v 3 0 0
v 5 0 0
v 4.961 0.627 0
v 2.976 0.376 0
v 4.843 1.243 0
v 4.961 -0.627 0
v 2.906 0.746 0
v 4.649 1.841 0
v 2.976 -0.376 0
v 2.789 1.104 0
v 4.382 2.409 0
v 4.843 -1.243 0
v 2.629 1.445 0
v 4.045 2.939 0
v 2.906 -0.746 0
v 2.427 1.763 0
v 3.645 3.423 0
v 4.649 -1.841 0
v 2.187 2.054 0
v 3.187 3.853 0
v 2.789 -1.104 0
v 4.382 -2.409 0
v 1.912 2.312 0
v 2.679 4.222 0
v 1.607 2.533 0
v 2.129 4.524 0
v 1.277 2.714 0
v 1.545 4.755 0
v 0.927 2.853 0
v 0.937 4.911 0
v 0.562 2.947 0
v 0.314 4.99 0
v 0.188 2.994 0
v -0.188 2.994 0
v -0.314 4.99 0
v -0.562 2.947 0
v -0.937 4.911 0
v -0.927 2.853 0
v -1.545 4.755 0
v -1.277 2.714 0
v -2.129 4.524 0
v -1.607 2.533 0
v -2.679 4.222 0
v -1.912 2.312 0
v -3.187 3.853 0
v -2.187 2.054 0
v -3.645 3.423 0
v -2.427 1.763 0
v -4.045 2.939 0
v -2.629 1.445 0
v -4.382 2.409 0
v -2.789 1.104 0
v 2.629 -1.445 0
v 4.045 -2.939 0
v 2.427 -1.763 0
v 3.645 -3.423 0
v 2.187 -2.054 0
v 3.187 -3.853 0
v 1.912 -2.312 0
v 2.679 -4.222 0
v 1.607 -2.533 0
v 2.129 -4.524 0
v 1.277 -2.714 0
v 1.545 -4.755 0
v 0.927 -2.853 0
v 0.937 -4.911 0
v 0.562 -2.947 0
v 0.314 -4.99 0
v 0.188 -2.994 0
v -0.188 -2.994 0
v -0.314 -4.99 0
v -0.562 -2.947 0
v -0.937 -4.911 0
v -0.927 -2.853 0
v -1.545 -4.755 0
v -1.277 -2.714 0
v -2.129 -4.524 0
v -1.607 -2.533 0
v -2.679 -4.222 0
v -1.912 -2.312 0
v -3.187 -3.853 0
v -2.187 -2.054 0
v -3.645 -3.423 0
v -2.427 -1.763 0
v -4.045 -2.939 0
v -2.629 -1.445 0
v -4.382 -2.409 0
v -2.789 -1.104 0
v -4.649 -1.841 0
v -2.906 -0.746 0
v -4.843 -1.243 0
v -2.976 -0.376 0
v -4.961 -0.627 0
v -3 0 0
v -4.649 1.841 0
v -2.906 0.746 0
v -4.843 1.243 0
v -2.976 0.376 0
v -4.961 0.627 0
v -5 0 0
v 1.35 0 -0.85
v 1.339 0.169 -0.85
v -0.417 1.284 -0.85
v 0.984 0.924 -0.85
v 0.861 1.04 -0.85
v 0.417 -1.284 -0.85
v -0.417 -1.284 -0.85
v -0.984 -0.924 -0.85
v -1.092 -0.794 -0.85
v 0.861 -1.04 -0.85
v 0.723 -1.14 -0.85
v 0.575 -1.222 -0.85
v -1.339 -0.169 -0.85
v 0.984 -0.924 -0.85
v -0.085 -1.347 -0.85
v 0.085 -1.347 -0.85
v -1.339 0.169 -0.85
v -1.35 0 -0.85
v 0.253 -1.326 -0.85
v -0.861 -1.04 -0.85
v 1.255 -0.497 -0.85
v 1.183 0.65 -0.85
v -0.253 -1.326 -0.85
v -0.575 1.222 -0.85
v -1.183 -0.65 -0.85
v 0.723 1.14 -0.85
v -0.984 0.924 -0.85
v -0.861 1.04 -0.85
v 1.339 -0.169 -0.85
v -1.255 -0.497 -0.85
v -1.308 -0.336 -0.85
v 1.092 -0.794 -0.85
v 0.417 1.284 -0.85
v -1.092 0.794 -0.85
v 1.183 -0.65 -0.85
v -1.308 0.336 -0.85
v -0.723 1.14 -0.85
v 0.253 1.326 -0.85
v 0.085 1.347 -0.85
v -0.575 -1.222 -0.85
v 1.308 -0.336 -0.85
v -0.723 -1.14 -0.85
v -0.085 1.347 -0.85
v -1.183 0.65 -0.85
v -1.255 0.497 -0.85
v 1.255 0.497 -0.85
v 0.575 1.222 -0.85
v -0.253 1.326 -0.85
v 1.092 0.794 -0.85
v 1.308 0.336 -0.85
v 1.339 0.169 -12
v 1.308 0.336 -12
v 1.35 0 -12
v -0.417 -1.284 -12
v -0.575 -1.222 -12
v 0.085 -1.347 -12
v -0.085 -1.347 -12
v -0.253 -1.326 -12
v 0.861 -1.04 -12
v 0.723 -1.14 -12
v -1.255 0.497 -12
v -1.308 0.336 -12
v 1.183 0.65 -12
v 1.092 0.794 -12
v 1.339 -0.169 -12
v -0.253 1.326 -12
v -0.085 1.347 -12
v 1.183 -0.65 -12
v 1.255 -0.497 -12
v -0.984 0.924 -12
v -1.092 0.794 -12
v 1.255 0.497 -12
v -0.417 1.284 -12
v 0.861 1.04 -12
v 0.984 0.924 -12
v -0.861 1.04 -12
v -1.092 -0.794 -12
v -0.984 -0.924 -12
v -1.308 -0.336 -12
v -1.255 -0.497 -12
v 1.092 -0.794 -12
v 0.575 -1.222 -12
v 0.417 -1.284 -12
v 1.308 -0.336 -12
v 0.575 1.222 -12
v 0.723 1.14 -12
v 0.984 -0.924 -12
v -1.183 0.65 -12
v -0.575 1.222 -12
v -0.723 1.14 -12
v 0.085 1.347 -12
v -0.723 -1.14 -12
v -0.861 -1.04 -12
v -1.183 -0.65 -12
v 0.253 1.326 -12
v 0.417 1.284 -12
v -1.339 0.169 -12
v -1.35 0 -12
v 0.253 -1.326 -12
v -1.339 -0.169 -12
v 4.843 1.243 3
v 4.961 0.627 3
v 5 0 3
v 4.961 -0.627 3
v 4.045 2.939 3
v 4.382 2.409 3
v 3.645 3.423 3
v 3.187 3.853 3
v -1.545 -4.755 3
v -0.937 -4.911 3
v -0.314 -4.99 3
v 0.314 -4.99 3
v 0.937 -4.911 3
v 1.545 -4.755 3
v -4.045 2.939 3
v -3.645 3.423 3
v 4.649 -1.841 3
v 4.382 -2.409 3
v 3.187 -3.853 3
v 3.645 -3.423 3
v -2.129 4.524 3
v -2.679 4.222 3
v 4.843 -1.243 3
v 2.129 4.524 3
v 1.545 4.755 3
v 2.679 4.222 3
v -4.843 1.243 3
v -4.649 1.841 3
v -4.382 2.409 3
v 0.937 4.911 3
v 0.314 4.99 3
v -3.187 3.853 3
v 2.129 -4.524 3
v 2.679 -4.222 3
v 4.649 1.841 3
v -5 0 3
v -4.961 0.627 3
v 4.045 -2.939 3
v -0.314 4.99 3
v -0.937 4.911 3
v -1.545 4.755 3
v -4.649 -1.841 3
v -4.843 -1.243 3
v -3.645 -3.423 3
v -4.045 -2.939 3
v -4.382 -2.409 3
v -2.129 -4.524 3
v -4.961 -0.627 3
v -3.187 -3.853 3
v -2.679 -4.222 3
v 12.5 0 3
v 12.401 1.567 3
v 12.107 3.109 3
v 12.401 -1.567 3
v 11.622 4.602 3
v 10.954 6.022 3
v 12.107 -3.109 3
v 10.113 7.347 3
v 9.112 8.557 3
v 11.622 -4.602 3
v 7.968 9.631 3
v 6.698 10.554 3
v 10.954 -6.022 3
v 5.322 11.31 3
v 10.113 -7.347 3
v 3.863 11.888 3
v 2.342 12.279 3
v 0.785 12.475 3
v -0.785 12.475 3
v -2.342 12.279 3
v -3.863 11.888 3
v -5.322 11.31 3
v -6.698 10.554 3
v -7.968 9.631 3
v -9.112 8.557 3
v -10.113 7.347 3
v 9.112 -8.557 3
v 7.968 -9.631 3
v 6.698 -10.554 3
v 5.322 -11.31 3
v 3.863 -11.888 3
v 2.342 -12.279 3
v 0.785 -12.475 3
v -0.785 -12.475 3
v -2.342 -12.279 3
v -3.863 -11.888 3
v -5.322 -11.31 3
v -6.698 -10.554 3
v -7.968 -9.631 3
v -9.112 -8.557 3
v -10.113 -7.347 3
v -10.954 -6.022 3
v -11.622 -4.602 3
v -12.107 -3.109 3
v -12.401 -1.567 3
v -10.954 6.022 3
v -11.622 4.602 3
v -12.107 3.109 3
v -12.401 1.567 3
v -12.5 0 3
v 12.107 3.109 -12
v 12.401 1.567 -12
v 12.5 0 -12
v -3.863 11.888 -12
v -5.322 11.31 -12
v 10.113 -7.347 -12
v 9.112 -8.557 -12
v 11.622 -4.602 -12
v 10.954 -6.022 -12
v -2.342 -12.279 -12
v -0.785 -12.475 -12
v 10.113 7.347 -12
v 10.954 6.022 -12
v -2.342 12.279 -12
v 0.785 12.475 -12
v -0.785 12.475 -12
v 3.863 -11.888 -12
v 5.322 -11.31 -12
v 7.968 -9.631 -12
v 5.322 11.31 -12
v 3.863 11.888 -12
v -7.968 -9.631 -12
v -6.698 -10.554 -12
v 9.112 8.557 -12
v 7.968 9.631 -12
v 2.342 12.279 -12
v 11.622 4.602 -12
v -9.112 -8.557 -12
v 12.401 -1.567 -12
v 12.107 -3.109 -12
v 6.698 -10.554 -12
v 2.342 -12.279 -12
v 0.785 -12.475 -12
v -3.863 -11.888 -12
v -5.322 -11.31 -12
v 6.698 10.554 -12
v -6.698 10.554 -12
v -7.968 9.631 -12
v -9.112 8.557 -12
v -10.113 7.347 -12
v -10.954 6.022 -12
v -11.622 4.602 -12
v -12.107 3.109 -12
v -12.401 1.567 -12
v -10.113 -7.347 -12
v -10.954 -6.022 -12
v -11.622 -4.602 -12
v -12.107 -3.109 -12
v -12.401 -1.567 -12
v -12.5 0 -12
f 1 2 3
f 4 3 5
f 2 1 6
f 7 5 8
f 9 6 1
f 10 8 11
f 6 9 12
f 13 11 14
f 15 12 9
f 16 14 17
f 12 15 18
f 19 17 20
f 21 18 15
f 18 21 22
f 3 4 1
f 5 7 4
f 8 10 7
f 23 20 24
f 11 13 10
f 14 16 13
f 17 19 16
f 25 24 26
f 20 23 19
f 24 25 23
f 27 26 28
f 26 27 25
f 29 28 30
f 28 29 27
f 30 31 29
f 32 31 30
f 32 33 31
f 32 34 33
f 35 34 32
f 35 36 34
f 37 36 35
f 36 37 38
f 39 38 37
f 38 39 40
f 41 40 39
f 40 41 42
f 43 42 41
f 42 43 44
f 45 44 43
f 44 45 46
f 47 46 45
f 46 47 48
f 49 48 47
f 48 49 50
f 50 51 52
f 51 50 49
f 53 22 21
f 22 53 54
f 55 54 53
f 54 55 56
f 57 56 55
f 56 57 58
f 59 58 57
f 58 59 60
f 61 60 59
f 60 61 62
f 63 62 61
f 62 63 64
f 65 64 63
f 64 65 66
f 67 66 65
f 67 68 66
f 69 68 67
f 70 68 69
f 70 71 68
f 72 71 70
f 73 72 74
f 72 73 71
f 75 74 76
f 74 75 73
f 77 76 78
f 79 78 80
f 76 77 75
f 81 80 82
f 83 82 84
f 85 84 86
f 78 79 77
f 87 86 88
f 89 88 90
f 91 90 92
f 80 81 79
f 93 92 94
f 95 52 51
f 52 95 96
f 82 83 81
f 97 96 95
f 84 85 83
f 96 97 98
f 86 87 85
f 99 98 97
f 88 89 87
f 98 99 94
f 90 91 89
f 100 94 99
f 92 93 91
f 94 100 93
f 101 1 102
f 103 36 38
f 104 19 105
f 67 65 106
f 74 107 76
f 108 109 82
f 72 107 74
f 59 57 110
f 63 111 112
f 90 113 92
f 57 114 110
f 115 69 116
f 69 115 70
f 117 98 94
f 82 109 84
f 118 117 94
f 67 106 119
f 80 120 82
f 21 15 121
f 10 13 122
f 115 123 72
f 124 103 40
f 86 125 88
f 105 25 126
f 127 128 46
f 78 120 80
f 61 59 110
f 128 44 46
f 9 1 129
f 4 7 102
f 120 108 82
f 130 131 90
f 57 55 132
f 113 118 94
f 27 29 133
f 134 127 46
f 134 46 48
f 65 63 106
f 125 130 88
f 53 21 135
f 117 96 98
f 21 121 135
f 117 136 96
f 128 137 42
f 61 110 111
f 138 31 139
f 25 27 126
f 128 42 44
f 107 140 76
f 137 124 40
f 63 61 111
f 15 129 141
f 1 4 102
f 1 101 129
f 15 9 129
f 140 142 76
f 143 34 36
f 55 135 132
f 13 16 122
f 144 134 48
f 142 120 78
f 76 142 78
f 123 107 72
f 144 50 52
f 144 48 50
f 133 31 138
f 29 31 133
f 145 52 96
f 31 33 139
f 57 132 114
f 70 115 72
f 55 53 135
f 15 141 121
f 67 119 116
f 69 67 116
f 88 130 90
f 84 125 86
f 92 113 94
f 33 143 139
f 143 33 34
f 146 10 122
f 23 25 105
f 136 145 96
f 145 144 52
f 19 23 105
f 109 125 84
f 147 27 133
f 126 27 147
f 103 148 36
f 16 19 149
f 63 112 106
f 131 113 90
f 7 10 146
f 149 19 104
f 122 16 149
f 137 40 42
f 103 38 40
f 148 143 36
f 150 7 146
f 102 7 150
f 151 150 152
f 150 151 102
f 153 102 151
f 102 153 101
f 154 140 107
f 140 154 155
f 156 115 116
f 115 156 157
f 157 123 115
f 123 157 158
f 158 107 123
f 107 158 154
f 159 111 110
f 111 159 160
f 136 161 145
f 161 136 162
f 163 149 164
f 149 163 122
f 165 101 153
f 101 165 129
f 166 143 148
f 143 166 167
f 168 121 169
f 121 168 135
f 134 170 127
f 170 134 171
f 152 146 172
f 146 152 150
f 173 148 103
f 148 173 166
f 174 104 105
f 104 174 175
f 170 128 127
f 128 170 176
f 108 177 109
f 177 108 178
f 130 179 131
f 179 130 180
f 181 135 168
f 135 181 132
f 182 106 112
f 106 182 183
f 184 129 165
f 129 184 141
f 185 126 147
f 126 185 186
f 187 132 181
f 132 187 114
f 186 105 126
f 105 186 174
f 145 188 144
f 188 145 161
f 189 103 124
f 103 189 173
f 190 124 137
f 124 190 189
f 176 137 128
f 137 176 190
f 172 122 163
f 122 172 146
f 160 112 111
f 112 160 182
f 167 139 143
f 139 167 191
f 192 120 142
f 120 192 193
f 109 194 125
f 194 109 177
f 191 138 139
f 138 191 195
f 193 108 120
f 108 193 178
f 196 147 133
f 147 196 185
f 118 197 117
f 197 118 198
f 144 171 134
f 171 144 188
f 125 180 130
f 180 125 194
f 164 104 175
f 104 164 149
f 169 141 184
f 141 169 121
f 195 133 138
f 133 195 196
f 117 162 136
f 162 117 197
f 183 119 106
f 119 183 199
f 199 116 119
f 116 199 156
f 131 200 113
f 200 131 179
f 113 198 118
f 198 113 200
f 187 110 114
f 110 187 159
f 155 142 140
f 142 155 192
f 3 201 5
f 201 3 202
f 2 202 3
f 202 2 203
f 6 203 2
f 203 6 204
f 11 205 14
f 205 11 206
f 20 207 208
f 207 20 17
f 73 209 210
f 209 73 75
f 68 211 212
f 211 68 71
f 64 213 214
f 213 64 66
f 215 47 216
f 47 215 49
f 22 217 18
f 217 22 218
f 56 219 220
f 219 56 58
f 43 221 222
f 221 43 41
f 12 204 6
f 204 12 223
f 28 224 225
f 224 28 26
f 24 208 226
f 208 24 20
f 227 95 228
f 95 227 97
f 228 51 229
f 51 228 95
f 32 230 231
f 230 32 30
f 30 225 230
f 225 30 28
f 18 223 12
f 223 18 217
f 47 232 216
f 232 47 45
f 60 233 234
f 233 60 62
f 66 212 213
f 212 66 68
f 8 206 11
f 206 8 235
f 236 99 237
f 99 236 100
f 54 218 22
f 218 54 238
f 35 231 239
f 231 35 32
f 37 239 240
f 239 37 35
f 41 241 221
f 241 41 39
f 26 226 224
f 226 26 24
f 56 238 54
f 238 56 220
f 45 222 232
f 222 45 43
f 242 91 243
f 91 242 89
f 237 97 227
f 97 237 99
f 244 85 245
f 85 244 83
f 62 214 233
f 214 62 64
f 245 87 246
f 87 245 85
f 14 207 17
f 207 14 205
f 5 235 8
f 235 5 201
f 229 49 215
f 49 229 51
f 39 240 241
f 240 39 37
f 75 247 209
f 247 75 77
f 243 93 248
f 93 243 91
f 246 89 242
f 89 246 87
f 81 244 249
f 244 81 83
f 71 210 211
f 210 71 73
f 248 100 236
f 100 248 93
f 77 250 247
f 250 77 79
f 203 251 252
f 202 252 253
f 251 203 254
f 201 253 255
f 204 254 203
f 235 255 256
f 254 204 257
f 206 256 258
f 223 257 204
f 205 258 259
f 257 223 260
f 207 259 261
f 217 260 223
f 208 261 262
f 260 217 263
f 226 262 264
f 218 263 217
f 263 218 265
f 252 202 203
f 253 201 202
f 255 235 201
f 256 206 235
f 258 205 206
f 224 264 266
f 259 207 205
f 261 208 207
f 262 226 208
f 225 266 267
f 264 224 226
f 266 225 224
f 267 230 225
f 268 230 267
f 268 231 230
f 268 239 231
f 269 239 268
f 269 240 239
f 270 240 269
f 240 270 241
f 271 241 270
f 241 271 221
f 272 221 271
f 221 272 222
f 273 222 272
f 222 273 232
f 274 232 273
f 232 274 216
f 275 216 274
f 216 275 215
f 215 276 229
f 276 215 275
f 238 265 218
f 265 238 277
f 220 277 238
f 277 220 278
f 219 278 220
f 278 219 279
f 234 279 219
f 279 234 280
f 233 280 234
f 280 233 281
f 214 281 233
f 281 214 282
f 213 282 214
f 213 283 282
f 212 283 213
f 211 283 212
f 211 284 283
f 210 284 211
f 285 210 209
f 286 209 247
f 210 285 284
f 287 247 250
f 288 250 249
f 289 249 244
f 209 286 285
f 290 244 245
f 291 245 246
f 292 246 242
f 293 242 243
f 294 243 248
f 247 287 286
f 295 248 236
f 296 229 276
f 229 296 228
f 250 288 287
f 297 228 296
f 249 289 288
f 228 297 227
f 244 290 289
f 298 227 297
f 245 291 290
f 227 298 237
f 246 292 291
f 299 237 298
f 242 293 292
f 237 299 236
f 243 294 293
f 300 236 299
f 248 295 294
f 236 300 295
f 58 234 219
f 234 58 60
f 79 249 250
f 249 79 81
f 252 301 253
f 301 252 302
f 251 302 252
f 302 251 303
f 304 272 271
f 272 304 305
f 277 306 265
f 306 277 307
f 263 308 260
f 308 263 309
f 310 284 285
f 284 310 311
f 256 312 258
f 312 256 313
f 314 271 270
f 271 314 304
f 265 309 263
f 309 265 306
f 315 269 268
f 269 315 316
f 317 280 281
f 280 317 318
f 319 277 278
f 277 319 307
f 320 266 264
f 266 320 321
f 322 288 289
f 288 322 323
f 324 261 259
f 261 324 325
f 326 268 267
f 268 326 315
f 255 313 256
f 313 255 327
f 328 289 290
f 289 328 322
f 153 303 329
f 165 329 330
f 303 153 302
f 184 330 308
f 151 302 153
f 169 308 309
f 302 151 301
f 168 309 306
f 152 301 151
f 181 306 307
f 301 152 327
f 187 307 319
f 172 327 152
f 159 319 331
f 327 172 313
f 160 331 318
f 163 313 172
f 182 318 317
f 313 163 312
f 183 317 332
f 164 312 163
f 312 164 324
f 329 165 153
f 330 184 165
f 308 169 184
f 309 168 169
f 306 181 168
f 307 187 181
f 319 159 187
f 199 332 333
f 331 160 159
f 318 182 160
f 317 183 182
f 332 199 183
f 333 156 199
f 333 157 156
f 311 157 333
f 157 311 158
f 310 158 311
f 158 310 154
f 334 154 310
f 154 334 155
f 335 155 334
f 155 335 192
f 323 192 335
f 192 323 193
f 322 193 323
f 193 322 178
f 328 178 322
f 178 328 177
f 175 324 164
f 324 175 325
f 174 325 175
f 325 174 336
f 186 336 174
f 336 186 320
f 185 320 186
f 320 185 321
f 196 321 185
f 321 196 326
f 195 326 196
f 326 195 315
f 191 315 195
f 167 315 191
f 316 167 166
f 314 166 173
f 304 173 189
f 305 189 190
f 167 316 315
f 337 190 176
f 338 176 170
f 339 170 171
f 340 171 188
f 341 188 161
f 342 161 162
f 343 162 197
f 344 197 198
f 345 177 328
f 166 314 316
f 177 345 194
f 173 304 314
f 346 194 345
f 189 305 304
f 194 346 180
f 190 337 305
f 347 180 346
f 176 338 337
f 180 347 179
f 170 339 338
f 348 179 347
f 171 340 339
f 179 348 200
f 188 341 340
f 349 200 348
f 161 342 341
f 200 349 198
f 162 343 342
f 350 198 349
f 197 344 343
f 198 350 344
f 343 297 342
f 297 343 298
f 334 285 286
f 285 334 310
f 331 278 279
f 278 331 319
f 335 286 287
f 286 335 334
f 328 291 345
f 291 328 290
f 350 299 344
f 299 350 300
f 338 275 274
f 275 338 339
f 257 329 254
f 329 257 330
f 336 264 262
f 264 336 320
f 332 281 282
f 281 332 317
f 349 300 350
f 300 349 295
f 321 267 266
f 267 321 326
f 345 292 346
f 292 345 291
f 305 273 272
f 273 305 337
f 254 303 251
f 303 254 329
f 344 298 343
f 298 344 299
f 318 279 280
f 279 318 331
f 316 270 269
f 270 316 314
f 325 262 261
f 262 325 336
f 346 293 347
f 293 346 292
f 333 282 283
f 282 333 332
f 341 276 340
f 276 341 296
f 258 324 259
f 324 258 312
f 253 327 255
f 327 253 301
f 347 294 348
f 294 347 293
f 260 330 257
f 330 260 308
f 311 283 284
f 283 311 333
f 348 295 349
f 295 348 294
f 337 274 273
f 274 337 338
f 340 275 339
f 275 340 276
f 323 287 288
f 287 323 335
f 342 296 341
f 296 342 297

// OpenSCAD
$fn = 50;

difference() {
	union() {
		translate(v = [0, 0, -12.0]) {
			cylinder(h = 15, r = 12.5);
		}
	}
	union() {
		translate(v = [0, 0, 0]) {
			rotate(a = [0, 0, 0]) {
				difference() {
					union() {
						translate(v = [0, 0, -15.0]) {
							cylinder(h = 15, r = 1.0);
						}
						translate(v = [0, 0, -0.85]) {
							cylinder(h = 0.85, r1 = 1.35, r2 = 3.0);
						}
						translate(v = [0, 0, -15.0]) {
							cylinder(h = 15, r = 1.35);
						}
						translate(v = [0, 0, -15.0]) {
							cylinder(h = 15, r = 1.0);
						}
					}
					union();
				}
			}
		}
		#cylinder(h = 3, r = 5.0);
	}
}
